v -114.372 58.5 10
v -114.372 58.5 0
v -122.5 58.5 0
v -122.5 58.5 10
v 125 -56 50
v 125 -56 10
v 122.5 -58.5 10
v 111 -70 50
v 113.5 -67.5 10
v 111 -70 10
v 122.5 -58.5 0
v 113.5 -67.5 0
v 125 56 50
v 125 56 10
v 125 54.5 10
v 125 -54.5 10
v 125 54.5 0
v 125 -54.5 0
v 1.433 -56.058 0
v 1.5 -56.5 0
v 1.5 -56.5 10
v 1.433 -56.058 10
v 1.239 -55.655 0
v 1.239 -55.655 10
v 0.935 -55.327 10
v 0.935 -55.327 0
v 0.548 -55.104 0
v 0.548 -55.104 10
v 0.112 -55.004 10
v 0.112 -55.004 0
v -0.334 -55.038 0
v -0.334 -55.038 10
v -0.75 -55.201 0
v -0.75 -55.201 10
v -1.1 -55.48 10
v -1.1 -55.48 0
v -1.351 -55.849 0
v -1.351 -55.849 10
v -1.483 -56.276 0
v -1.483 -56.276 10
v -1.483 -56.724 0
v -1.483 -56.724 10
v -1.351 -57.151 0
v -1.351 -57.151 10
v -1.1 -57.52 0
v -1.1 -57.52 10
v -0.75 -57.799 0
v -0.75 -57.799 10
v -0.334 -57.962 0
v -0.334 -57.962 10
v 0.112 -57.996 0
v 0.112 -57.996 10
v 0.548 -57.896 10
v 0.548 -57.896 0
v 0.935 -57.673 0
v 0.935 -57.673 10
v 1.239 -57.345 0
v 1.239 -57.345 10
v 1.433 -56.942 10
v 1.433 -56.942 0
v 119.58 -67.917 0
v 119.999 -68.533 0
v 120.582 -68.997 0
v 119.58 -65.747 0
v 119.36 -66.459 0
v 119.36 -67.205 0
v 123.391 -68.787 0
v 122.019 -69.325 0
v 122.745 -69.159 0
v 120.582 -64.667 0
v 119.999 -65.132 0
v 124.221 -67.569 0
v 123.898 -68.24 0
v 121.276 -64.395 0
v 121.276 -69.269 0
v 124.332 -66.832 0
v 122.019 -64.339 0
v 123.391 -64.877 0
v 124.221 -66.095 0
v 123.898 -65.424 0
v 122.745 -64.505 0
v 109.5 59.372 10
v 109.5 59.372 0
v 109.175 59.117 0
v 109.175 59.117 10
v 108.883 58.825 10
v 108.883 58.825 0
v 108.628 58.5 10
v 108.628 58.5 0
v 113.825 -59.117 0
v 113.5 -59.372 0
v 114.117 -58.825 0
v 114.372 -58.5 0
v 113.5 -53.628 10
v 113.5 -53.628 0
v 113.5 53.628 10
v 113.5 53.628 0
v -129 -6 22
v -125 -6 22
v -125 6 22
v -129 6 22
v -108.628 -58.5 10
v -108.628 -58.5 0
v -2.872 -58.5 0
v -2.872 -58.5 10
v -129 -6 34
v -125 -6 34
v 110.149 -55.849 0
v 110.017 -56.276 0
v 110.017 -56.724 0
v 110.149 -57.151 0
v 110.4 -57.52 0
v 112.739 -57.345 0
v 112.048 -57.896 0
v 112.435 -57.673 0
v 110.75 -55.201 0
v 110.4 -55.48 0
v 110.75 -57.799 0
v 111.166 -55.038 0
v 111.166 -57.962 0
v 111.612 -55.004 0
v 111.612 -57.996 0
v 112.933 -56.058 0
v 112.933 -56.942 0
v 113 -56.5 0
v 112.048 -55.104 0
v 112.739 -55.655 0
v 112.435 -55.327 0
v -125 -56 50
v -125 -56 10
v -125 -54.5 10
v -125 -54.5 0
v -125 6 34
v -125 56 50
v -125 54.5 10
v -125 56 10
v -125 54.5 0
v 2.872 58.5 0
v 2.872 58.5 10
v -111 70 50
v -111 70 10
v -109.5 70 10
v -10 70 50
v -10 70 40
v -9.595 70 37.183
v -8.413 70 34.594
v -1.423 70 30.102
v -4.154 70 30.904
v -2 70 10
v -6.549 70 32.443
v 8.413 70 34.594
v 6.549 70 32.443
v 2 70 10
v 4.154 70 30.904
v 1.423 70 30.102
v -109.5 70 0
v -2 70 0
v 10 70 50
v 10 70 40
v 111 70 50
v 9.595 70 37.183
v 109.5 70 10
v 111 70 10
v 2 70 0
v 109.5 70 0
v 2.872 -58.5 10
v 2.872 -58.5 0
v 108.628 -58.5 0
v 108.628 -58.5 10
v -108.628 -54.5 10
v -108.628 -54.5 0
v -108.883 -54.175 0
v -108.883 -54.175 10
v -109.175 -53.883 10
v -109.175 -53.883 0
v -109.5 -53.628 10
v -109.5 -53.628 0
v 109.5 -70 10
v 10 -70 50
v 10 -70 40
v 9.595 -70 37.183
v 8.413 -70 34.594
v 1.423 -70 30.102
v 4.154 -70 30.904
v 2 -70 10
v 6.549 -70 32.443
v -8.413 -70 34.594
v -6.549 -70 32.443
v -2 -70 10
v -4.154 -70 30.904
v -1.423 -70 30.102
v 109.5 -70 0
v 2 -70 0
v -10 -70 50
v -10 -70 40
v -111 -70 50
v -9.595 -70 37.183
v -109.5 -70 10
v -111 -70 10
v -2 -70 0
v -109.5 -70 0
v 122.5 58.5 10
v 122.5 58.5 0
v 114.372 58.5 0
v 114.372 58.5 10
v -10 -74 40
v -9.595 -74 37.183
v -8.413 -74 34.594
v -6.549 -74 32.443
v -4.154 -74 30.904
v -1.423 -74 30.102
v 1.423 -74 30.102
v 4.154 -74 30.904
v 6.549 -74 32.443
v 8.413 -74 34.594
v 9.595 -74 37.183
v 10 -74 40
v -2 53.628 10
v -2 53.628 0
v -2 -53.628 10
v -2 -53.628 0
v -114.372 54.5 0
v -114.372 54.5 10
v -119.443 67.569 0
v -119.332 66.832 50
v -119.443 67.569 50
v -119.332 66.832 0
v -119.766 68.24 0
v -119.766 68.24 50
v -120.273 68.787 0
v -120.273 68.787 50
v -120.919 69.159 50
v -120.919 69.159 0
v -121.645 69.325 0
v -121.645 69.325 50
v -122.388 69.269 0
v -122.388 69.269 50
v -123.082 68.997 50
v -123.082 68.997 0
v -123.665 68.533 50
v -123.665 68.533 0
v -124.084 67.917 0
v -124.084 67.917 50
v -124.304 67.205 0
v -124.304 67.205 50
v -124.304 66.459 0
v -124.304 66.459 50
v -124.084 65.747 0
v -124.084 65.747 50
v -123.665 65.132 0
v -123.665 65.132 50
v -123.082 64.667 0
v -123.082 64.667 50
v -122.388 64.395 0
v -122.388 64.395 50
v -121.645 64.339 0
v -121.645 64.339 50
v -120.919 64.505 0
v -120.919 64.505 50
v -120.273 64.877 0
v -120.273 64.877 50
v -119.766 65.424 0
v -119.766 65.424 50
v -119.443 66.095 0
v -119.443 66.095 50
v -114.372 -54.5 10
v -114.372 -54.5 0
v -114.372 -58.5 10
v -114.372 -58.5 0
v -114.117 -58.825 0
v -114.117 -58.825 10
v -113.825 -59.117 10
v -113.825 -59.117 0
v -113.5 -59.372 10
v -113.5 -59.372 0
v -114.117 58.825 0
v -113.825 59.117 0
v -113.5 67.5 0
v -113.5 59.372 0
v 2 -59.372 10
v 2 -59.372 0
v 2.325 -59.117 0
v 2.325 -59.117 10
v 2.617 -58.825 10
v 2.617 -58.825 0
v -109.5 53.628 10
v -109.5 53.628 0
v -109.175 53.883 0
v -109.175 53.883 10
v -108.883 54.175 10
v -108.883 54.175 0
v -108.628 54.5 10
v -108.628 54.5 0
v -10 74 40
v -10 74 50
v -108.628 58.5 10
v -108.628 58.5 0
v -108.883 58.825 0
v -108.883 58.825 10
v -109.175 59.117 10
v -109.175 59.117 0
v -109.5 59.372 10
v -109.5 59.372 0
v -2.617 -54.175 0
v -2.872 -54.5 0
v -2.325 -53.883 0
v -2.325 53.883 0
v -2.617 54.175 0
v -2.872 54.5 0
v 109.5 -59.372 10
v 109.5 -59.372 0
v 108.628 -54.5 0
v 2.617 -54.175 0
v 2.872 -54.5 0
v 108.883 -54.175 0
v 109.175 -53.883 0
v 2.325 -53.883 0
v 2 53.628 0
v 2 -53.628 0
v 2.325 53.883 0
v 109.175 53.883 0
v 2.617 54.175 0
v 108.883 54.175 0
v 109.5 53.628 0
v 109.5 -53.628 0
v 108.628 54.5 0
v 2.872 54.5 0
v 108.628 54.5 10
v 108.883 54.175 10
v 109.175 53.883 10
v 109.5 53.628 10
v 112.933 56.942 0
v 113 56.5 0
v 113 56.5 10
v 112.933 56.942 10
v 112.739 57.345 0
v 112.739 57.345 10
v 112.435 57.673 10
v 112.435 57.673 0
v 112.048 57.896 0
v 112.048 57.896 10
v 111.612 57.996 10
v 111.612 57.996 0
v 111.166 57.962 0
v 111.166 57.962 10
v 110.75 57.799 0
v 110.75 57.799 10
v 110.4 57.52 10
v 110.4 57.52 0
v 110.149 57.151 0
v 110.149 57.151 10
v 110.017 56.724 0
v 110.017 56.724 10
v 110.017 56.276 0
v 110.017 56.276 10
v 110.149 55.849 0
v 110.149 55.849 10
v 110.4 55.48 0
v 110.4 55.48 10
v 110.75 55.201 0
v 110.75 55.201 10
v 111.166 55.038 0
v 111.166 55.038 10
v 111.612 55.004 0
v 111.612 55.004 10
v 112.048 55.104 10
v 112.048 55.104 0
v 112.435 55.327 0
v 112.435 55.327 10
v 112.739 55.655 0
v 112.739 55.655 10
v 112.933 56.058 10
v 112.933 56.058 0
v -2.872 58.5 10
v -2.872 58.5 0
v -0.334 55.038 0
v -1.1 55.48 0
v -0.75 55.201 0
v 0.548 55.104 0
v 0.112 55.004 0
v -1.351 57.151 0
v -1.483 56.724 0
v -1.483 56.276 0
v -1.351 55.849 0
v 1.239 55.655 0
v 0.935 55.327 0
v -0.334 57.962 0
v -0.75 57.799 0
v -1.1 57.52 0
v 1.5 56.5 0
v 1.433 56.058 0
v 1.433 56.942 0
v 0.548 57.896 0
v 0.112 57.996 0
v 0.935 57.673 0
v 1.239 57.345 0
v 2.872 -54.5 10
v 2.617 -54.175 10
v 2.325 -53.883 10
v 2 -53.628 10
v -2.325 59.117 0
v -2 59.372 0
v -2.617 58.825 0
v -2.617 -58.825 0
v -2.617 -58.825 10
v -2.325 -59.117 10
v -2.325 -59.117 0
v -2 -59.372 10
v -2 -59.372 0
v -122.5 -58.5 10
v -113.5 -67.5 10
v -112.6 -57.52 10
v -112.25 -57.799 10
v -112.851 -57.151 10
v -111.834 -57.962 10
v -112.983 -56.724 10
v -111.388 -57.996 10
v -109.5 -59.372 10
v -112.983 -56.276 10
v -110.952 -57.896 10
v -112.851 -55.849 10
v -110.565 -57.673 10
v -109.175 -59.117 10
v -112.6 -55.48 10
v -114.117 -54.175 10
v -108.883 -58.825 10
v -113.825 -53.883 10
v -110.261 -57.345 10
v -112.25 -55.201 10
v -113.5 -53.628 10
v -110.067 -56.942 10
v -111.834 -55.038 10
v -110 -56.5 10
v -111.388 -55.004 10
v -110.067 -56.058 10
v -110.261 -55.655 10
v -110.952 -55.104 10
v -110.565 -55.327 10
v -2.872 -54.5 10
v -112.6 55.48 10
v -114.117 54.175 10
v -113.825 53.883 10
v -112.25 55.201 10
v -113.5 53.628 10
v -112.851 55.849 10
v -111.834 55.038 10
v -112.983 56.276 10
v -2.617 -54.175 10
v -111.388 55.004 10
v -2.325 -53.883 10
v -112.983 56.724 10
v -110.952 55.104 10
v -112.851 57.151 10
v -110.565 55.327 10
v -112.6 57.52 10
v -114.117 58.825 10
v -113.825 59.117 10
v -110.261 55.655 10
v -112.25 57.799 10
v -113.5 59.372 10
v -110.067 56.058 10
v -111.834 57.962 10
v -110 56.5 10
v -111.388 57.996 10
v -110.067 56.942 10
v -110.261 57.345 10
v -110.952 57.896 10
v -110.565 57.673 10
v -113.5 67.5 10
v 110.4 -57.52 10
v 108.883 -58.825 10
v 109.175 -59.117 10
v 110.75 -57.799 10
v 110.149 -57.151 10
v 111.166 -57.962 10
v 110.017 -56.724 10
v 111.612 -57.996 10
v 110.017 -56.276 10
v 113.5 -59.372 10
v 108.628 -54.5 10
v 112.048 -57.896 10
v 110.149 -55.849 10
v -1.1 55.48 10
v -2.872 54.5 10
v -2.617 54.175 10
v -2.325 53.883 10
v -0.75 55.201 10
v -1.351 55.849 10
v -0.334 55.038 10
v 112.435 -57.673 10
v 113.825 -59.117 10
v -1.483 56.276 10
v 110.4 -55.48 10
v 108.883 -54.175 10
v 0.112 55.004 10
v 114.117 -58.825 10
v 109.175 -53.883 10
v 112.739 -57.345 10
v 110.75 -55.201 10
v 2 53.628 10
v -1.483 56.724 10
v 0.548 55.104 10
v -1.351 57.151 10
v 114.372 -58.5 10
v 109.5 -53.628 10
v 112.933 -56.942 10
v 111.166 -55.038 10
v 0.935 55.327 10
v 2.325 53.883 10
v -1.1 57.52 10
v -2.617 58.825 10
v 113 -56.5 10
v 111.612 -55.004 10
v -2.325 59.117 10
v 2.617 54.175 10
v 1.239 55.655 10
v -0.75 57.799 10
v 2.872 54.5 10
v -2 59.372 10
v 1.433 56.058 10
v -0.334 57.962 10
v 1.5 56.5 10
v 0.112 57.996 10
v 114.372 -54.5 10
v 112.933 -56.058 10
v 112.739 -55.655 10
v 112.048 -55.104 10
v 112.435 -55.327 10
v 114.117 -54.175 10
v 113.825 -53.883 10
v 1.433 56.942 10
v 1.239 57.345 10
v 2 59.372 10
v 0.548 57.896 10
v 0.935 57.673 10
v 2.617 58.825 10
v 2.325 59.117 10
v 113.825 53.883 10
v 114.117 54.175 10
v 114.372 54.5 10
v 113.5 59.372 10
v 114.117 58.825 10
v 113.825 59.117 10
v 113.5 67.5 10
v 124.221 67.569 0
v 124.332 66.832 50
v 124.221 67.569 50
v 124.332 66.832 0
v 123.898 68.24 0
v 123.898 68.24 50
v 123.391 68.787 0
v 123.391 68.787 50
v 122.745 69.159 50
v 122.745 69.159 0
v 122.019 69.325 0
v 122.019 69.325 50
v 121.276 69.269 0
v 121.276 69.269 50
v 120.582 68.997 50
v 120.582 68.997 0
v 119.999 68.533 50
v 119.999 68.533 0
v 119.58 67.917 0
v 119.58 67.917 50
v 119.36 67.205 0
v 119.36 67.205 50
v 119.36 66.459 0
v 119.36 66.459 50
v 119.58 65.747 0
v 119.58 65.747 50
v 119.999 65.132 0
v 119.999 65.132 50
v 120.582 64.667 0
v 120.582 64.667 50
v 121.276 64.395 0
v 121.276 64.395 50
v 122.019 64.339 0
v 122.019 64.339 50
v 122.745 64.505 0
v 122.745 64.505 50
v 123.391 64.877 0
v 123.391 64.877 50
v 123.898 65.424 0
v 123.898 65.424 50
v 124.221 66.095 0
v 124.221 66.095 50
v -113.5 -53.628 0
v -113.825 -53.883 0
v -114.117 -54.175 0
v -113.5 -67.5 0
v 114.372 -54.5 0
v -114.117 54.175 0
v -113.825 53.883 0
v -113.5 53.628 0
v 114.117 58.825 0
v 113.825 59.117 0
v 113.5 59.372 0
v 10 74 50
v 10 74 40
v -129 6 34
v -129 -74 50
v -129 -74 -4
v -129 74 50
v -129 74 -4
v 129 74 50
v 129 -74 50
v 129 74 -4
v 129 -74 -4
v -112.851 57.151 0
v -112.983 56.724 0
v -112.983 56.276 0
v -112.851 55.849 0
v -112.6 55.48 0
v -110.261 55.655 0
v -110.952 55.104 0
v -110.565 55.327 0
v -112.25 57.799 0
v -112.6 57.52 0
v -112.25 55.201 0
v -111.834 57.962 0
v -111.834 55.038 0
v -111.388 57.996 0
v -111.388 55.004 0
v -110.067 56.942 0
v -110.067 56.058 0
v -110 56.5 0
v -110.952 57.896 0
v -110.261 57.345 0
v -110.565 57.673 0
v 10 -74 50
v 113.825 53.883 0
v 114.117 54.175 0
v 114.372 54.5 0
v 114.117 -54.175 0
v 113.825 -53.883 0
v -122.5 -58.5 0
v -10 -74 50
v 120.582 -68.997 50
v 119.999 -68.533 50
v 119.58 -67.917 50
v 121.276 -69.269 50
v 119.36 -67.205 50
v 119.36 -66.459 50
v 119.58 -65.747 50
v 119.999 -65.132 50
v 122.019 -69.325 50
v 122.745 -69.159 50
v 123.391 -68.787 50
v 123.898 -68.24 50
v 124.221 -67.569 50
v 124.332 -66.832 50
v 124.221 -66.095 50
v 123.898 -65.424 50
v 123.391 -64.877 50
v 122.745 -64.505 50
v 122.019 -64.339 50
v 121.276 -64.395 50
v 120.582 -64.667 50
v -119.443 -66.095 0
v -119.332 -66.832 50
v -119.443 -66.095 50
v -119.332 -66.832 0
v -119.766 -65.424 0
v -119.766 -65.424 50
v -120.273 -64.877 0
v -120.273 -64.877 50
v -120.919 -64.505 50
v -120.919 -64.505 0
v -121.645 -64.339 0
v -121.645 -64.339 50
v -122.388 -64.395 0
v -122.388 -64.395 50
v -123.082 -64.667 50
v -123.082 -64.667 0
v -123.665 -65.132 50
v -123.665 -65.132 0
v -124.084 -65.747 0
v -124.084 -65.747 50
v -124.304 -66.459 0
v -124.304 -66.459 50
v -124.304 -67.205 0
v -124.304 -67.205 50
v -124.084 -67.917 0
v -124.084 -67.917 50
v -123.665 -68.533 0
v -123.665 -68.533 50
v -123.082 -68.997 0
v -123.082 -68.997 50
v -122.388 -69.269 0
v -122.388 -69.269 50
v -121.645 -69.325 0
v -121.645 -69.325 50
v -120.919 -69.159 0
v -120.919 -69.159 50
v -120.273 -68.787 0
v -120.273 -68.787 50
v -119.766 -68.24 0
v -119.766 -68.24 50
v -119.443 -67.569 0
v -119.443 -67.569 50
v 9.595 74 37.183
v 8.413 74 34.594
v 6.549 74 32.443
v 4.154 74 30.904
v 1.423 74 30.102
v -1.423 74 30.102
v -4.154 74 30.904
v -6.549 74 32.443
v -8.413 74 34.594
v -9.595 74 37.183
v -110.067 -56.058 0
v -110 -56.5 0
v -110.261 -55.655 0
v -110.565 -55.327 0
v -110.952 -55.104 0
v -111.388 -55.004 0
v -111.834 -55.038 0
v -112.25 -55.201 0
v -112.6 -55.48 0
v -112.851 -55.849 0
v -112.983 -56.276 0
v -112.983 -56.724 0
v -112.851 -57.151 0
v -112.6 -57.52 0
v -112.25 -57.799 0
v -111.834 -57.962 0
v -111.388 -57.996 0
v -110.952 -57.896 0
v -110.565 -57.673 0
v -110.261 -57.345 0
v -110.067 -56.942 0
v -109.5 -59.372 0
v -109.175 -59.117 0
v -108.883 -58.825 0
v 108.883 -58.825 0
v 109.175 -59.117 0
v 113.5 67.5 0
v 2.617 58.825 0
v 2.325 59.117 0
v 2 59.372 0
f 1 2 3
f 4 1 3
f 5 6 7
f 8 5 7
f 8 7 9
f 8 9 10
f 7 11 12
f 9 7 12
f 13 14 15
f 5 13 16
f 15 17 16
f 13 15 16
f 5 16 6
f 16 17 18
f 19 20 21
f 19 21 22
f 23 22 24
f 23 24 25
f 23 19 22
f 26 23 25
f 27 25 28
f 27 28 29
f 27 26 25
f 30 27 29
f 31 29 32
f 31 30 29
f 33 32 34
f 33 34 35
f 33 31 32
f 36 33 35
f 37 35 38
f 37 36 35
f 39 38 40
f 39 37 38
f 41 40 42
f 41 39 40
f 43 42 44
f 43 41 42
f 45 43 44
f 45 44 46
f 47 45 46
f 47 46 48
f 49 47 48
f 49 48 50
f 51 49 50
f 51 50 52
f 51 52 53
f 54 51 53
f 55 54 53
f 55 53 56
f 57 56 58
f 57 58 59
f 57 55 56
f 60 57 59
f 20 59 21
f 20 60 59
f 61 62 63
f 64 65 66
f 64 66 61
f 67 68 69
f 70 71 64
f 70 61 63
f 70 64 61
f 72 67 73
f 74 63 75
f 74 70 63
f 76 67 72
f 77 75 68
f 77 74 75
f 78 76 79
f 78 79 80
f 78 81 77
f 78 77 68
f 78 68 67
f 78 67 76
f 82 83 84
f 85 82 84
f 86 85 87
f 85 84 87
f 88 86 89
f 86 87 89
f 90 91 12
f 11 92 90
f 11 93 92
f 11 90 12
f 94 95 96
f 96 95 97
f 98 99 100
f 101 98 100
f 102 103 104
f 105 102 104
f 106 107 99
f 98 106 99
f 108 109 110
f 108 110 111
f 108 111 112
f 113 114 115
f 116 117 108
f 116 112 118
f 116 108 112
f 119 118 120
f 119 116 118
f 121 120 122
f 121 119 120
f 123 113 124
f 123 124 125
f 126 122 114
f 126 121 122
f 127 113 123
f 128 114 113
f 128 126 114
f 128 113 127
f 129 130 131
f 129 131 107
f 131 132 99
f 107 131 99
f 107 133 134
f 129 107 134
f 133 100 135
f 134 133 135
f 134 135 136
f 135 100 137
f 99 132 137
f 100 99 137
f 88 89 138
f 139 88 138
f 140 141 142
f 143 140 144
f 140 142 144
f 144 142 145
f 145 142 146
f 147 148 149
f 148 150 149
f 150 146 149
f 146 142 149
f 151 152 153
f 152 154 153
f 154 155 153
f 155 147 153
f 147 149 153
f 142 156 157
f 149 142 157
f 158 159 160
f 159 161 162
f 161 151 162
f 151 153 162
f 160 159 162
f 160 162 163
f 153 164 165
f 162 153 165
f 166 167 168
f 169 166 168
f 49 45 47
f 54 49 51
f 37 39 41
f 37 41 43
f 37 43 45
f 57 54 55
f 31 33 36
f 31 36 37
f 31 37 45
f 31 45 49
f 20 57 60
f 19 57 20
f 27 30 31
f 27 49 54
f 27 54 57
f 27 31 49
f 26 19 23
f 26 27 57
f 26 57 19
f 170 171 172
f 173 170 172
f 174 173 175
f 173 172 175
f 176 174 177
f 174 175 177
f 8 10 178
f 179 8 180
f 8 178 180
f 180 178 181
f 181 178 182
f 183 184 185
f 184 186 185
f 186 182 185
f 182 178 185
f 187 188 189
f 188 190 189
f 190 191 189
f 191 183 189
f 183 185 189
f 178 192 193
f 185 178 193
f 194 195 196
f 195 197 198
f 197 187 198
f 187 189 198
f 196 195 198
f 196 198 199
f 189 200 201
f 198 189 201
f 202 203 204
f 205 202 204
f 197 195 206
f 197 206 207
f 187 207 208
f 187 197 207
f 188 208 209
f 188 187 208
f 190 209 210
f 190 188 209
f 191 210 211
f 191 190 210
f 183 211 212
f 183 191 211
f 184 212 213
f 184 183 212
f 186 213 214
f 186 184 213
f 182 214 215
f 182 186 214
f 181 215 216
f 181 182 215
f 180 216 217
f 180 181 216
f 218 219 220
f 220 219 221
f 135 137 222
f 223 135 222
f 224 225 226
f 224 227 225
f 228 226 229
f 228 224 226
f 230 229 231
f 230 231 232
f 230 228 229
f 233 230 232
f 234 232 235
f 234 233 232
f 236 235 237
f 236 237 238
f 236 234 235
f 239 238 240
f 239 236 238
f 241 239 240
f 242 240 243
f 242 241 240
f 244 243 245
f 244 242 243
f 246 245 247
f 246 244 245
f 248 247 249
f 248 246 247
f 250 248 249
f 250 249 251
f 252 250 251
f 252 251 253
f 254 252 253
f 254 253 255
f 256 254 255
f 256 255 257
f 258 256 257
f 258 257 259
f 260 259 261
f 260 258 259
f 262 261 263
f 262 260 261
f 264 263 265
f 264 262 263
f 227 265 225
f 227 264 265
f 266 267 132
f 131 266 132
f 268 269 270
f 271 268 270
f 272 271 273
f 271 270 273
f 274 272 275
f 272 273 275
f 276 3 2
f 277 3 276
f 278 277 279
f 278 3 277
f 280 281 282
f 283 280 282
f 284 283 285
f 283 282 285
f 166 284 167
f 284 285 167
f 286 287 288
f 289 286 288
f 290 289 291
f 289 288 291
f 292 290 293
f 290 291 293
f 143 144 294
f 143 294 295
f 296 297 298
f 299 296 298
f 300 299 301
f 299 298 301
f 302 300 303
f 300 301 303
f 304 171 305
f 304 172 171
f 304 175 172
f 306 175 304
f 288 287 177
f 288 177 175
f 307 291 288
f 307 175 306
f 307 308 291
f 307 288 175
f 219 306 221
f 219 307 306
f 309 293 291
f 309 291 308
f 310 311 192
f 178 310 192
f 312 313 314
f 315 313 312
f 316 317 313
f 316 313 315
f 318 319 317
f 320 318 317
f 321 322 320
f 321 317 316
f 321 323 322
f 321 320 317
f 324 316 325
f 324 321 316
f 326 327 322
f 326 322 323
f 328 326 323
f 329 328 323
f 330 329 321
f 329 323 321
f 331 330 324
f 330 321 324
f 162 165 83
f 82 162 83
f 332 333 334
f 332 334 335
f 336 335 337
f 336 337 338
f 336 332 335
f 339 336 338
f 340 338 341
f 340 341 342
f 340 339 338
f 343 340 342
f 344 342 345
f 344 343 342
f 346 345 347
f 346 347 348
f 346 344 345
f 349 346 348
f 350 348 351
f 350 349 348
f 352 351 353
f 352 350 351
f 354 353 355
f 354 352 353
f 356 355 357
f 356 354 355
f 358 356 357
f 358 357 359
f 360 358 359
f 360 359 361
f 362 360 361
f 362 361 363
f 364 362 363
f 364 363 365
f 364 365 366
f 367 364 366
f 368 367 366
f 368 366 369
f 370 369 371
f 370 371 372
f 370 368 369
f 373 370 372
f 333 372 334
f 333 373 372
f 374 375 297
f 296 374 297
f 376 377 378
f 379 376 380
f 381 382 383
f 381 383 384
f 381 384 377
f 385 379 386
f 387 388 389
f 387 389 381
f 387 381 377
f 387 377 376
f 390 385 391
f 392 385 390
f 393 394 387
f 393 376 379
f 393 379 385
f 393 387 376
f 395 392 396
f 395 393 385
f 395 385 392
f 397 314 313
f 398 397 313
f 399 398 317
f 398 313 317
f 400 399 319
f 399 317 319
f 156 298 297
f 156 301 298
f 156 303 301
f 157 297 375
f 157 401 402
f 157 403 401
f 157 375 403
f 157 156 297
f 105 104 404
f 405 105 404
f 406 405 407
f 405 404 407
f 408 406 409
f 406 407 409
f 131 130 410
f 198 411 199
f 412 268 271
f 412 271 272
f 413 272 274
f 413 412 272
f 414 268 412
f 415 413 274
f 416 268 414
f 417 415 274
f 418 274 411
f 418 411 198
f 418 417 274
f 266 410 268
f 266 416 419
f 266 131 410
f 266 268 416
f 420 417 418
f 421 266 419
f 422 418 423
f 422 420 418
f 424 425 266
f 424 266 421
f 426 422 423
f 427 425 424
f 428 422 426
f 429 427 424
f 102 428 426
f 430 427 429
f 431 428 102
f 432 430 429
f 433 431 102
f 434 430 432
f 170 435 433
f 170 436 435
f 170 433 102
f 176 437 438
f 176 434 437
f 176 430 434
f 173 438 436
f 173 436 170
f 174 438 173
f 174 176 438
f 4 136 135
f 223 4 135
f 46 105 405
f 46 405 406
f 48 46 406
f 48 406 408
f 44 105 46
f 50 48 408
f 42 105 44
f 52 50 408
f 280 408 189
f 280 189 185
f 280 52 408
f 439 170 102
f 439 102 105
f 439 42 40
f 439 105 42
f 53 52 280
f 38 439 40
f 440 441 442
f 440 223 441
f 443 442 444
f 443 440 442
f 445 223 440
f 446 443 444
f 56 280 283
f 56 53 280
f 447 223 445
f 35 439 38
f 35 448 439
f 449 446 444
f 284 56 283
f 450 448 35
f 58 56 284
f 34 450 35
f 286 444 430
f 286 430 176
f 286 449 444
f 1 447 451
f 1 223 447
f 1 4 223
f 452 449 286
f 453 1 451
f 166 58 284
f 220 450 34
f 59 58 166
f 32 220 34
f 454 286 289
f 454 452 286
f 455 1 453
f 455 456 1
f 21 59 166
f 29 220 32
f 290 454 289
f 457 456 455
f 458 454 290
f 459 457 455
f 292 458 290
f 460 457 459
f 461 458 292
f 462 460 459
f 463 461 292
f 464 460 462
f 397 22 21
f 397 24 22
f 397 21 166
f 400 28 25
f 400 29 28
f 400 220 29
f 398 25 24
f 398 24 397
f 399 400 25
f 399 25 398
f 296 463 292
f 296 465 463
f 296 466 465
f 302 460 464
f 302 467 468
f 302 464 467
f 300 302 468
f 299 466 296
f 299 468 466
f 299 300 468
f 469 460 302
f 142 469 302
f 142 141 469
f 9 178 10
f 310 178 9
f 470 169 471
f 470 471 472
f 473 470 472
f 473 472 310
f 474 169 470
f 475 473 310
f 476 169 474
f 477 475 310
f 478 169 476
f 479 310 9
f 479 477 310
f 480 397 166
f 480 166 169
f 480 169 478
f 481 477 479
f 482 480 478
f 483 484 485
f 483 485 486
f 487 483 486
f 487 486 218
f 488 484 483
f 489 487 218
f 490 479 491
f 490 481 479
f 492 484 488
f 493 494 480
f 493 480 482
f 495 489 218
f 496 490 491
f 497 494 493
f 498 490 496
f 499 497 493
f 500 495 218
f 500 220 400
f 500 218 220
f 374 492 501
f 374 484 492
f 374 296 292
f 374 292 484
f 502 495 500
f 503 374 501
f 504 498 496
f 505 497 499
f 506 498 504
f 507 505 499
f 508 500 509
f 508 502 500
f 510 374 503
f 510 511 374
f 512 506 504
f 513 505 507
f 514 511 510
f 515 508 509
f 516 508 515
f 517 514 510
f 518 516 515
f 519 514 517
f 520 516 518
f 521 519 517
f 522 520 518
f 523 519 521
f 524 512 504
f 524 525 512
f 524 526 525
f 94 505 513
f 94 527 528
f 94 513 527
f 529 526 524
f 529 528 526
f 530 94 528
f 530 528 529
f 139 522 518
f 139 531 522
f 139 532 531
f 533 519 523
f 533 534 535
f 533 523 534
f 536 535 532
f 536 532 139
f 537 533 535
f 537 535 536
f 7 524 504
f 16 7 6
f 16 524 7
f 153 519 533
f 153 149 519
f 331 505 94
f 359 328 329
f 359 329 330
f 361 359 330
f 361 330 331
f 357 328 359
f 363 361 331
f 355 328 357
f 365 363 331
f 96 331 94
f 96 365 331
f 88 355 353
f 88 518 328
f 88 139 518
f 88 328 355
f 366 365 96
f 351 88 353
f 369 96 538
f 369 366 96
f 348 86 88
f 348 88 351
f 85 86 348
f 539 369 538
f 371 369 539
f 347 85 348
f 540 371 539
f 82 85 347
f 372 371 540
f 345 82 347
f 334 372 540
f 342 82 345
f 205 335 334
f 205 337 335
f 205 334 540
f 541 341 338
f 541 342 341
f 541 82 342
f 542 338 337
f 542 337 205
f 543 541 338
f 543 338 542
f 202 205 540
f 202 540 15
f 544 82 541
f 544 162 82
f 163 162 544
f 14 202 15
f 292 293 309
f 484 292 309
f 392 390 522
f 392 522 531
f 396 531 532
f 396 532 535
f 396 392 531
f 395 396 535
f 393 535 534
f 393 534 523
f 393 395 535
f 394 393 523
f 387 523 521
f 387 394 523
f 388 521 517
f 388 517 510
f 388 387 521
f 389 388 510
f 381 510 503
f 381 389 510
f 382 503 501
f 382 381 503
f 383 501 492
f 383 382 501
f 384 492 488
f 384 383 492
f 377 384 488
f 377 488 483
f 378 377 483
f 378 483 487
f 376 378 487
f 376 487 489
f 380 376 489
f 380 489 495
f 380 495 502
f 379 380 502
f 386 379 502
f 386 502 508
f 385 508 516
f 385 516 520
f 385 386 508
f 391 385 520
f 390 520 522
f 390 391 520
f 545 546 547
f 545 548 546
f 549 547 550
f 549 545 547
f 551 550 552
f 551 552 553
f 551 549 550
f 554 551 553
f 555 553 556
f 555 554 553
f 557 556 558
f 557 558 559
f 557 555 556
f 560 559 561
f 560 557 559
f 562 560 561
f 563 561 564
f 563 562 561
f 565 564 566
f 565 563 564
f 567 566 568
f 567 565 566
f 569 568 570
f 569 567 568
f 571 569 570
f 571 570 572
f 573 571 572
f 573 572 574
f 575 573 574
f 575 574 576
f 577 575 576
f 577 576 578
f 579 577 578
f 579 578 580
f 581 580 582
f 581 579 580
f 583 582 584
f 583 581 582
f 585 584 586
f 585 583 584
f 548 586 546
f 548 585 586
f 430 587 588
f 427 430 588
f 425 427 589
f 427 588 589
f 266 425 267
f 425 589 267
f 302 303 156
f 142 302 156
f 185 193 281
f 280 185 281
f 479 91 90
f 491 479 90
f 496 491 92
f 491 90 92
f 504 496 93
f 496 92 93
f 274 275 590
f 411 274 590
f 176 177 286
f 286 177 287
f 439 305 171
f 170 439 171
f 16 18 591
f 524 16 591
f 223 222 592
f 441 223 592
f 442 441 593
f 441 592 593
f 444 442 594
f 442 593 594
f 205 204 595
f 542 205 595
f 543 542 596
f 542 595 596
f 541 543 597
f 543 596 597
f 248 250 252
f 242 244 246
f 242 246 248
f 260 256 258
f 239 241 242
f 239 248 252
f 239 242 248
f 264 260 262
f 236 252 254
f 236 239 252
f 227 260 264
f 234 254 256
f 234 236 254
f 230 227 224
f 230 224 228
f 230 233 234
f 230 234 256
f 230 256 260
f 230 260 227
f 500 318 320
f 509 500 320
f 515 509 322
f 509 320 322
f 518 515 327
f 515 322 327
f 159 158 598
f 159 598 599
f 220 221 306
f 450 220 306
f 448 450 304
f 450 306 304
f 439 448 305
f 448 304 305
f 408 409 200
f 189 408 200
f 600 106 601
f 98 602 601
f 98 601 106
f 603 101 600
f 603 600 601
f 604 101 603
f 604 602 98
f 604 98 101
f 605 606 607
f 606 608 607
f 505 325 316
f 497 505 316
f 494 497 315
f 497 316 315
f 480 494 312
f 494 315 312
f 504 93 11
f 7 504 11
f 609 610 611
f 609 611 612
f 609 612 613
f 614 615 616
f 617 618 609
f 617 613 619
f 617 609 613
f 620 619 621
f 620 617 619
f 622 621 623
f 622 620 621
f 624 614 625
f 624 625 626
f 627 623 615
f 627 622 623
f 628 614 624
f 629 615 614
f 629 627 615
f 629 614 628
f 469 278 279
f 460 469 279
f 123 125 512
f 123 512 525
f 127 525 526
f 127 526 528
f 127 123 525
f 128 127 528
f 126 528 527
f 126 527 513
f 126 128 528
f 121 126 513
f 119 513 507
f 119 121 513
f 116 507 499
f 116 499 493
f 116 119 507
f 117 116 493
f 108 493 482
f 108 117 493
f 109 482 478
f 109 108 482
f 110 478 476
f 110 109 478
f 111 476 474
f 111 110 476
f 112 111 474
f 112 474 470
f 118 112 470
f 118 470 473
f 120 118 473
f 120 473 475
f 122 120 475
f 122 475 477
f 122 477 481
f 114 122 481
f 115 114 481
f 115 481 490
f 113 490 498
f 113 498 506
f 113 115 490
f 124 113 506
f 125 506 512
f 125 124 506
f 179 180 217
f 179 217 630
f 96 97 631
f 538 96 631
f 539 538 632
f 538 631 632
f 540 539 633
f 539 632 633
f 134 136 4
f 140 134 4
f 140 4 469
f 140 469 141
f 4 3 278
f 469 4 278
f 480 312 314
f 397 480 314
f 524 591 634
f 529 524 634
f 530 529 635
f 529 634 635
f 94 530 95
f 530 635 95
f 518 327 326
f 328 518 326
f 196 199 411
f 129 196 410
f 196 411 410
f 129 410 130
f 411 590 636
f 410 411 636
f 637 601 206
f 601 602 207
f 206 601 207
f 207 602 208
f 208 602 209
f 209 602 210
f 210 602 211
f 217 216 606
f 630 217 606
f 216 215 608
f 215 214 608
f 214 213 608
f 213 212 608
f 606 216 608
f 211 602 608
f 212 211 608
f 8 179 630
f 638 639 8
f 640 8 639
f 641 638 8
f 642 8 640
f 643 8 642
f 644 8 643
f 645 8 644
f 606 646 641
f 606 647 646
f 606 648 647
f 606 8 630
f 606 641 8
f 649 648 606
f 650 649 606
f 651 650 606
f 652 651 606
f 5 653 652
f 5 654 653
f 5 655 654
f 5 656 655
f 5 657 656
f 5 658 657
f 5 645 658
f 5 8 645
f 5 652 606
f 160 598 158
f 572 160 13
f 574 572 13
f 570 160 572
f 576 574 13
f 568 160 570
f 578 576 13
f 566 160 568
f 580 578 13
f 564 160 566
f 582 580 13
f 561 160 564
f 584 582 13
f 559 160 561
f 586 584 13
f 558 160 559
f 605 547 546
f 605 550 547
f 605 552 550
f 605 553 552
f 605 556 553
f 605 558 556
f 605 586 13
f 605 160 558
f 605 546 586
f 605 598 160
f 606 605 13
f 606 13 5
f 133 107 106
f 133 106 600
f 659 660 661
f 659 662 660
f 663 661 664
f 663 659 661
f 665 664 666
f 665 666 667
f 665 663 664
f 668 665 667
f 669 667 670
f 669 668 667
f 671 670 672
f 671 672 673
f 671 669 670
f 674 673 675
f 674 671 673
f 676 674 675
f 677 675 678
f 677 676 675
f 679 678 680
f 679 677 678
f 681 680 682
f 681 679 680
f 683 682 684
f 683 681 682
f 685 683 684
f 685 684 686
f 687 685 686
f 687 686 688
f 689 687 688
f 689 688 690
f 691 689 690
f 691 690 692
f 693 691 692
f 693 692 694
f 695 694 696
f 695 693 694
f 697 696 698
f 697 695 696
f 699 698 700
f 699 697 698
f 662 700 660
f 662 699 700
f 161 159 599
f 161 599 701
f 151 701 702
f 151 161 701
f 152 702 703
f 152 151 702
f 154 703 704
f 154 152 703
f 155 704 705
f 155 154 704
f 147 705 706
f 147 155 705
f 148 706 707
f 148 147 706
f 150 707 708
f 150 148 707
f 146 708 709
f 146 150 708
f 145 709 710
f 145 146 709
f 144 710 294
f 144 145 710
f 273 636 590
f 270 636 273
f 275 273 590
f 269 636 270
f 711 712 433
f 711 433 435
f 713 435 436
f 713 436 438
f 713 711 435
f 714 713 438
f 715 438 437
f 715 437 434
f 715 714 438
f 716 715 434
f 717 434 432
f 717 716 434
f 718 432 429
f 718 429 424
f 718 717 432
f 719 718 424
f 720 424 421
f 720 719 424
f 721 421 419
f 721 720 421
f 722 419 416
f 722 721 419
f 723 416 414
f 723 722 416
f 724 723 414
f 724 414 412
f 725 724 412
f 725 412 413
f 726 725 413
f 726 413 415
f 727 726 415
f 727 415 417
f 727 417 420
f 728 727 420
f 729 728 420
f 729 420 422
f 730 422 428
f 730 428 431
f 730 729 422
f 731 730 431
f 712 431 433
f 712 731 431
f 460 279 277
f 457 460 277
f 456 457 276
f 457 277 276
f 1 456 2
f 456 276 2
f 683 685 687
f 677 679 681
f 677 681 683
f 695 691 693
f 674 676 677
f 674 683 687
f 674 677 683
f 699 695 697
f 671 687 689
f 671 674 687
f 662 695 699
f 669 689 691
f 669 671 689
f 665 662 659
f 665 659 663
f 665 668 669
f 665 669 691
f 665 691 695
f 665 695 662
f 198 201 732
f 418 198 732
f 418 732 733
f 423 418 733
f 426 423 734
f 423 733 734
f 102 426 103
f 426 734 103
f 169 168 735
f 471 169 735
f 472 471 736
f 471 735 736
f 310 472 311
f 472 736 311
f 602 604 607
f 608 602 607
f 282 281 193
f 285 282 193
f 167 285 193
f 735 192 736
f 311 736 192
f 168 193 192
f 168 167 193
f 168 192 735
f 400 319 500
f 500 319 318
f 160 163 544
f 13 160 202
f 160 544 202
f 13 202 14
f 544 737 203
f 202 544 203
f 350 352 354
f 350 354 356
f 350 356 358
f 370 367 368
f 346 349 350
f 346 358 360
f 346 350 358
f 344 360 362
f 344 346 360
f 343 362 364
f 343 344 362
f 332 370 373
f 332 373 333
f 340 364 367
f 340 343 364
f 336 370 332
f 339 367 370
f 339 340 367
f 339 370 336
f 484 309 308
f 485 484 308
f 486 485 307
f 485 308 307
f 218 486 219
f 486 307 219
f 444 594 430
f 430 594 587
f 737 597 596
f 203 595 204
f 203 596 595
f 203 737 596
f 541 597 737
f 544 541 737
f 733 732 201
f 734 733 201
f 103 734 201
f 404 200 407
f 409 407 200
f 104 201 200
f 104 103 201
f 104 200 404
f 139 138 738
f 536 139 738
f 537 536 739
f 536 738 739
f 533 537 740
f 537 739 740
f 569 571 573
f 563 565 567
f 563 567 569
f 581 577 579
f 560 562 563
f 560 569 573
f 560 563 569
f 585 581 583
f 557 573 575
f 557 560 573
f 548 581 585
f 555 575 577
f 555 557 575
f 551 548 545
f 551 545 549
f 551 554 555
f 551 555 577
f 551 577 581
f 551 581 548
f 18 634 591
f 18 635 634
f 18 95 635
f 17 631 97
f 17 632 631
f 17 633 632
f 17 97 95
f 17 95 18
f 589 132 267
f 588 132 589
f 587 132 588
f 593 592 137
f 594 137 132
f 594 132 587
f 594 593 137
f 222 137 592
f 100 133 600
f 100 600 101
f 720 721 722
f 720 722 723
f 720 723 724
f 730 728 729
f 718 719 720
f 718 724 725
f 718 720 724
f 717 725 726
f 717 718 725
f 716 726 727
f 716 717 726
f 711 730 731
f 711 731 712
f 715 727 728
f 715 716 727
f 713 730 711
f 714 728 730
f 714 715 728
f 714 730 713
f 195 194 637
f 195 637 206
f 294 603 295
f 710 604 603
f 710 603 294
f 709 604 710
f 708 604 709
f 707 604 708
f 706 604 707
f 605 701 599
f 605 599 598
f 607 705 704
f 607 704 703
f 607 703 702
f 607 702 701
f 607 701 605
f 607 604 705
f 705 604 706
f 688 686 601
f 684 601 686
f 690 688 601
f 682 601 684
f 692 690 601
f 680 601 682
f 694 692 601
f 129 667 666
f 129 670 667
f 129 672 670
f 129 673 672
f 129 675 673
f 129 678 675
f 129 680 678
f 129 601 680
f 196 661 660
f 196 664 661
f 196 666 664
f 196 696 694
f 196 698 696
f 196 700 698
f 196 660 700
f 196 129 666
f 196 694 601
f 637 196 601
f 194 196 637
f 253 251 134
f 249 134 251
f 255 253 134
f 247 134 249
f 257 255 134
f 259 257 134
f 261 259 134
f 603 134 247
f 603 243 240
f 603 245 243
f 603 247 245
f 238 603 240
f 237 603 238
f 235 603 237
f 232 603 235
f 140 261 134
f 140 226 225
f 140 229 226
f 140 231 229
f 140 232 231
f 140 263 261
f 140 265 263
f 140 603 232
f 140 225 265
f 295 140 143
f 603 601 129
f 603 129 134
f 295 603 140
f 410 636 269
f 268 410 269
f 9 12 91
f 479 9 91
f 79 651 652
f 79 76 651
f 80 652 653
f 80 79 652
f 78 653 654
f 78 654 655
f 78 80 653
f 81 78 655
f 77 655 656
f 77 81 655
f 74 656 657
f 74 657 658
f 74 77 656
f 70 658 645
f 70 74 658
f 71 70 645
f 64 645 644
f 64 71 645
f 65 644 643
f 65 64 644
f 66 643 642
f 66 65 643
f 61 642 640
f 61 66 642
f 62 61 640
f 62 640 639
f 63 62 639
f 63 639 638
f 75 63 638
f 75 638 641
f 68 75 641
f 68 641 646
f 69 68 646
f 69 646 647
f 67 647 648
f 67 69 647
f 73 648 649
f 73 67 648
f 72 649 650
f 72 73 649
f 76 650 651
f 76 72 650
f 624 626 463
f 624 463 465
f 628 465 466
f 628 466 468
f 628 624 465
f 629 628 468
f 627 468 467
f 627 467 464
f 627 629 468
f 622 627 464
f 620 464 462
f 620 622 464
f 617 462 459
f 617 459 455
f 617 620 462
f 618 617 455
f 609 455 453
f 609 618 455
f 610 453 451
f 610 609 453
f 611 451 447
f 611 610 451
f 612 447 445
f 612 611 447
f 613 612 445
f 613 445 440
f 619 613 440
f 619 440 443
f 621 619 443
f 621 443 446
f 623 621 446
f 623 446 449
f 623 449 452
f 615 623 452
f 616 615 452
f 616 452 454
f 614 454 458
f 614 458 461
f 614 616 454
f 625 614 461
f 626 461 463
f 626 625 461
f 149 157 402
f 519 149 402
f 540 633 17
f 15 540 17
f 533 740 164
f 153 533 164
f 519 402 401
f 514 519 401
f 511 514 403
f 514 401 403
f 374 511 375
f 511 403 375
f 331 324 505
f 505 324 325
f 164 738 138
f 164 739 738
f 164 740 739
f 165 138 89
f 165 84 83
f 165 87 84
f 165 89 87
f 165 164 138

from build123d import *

# Parameters (mm, degrees)
ESQUISSE1_W             = 258
ESQUISSE1_H             = 148
ESQUISSE1_R             = 2.5
ESQUISSE1_R_2           = 1.5
BOSS_EXTRU_2_DEPTH      = 10
ESQUISSE1_5_W           = 258
ESQUISSE1_5_H           = 148
BOSS_EXTRU_3_DEPTH      = 4
ESQUISSE2_W             = 258
ESQUISSE2_H             = 148
ESQUISSE2_R             = 2.5
BOSS_EXTRU_5_DEPTH      = 40
ENL_V_MAT_EXTRU_1_REACH = 271.243
ESQUISSE4_W             = 12
ESQUISSE4_H             = 12
ENL_V_MAT_EXTRU_2_REACH = 201.692
ENL_V_MAT_EXTRU_3_REACH = 201.692


with BuildPart() as part:
    # Esquisse1 → Boss.-Extru.2 (new body)
    with BuildSketch(Plane.XY):
        Rectangle(ESQUISSE1_W, ESQUISSE1_H)
        with BuildLine():
            Line((-109.5, 59.372281323), (-109.5, 70))
            Line((-109.5, 70), (-2, 70))
            Line((-2, 70), (-2, 59.372281323))
            ThreePointArc((-2, 59.372281323), (-2.474873734, 58.974873734), (-2.872281323, 58.5))
            Line((-2.872281323, 58.5), (-108.627718677, 58.5))
            ThreePointArc((-108.627718677, 58.5), (-109.025126266, 58.974873734), (-109.5, 59.372281323))
        make_face(mode=Mode.SUBTRACT)
        with BuildLine():
            Line((-113.5, 67.5), (-113.5, 59.372281323))
            ThreePointArc((-113.5, 59.372281323), (-113.974873734, 58.974873734), (-114.372281323, 58.5))
            Line((-114.372281323, 58.5), (-122.5, 58.5))
            Line((-122.5, 58.5), (-113.5, 67.5))
        make_face(mode=Mode.SUBTRACT)
        with Locations((-121.8320772, -66.8320772)):
            Circle(ESQUISSE1_R, mode=Mode.SUBTRACT)
        with Locations((121.8320772, -66.8320772)):
            Circle(ESQUISSE1_R, mode=Mode.SUBTRACT)
        with Locations((-121.8320772, 66.8320772)):
            Circle(ESQUISSE1_R, mode=Mode.SUBTRACT)
        with Locations((121.8320772, 66.8320772)):
            Circle(ESQUISSE1_R, mode=Mode.SUBTRACT)
        with BuildLine():
            Line((-125, -54.5), (-125, 54.5))
            Line((-125, 54.5), (-114.372281323, 54.5))
            ThreePointArc((-114.372281323, 54.5), (-113.974873734, 54.025126266), (-113.5, 53.627718677))
            Line((-113.5, 53.627718677), (-113.5, -53.627718677))
            ThreePointArc((-113.5, -53.627718677), (-113.974873734, -54.025126266), (-114.372281323, -54.5))
            Line((-114.372281323, -54.5), (-125, -54.5))
        make_face(mode=Mode.SUBTRACT)
        with BuildLine():
            Line((-113.5, -67.5), (-122.5, -58.5))
            Line((-122.5, -58.5), (-114.372281323, -58.5))
            ThreePointArc((-114.372281323, -58.5), (-113.974873734, -58.974873734), (-113.5, -59.372281323))
            Line((-113.5, -59.372281323), (-113.5, -67.5))
        make_face(mode=Mode.SUBTRACT)
        with BuildLine():
            Line((-2, -70), (-109.5, -70))
            Line((-109.5, -70), (-109.5, -59.372281323))
            ThreePointArc((-109.5, -59.372281323), (-109.025126266, -58.974873734), (-108.627718677, -58.5))
            Line((-108.627718677, -58.5), (-2.872281323, -58.5))
            ThreePointArc((-2.872281323, -58.5), (-2.474873734, -58.974873734), (-2, -59.372281323))
            Line((-2, -59.372281323), (-2, -70))
        make_face(mode=Mode.SUBTRACT)
        with BuildLine():
            Line((109.5, -70), (2, -70))
            Line((2, -70), (2, -59.372281323))
            ThreePointArc((2, -59.372281323), (2.474873734, -58.974873734), (2.872281323, -58.5))
            Line((2.872281323, -58.5), (108.627718677, -58.5))
            ThreePointArc((108.627718677, -58.5), (109.025126266, -58.974873734), (109.5, -59.372281323))
            Line((109.5, -59.372281323), (109.5, -70))
        make_face(mode=Mode.SUBTRACT)
        with BuildLine():
            Line((122.5, -58.5), (113.5, -67.5))
            Line((113.5, -67.5), (113.5, -59.372281323))
            ThreePointArc((113.5, -59.372281323), (113.974873734, -58.974873734), (114.372281323, -58.5))
            Line((114.372281323, -58.5), (122.5, -58.5))
        make_face(mode=Mode.SUBTRACT)
        with BuildLine():
            Line((125, 54.5), (125, -54.5))
            Line((125, -54.5), (114.372281323, -54.5))
            ThreePointArc((114.372281323, -54.5), (113.974873734, -54.025126266), (113.5, -53.627718677))
            Line((113.5, -53.627718677), (113.5, 53.627718677))
            ThreePointArc((113.5, 53.627718677), (113.974873734, 54.025126266), (114.372281323, 54.5))
            Line((114.372281323, 54.5), (125, 54.5))
        make_face(mode=Mode.SUBTRACT)
        with BuildLine():
            Line((113.5, 67.5), (122.5, 58.5))
            Line((122.5, 58.5), (114.372281323, 58.5))
            ThreePointArc((114.372281323, 58.5), (113.974873734, 58.974873734), (113.5, 59.372281323))
            Line((113.5, 59.372281323), (113.5, 67.5))
        make_face(mode=Mode.SUBTRACT)
        with BuildLine():
            Line((2, 70), (109.5, 70))
            Line((109.5, 70), (109.5, 59.372281323))
            ThreePointArc((109.5, 59.372281323), (109.025126266, 58.974873734), (108.627718677, 58.5))
            Line((108.627718677, 58.5), (2.872281323, 58.5))
            ThreePointArc((2.872281323, 58.5), (2.474873734, 58.974873734), (2, 59.372281323))
            Line((2, 59.372281323), (2, 70))
        make_face(mode=Mode.SUBTRACT)
        with BuildLine():
            ThreePointArc((-109.5, 53.627718677), (-109.025126266, 54.025126266), (-108.627718677, 54.5))
            Line((-108.627718677, 54.5), (-2.872281323, 54.5))
            ThreePointArc((-2.872281323, 54.5), (-2.474873734, 54.025126266), (-2, 53.627718677))
            Line((-2, 53.627718677), (-2, -53.627718677))
            ThreePointArc((-2, -53.627718677), (-2.474873734, -54.025126266), (-2.872281323, -54.5))
            Line((-2.872281323, -54.5), (-108.627718677, -54.5))
            ThreePointArc((-108.627718677, -54.5), (-109.025126266, -54.025126266), (-109.5, -53.627718677))
            Line((-109.5, -53.627718677), (-109.5, 53.627718677))
        make_face(mode=Mode.SUBTRACT)
        with Locations((-111.5, 56.5)):
            Circle(ESQUISSE1_R_2, mode=Mode.SUBTRACT)
        with Locations((-111.5, -56.5)):
            Circle(ESQUISSE1_R_2, mode=Mode.SUBTRACT)
        with BuildLine():
            ThreePointArc((2.872281323, -54.5), (2.474873734, -54.025126266), (2, -53.627718677))
            Line((2, -53.627718677), (2, 53.627718677))
            ThreePointArc((2, 53.627718677), (2.474873734, 54.025126266), (2.872281323, 54.5))
            Line((2.872281323, 54.5), (108.627718677, 54.5))
            ThreePointArc((108.627718677, 54.5), (109.025126266, 54.025126266), (109.5, 53.627718677))
            Line((109.5, 53.627718677), (109.5, -53.627718677))
            ThreePointArc((109.5, -53.627718677), (109.025126266, -54.025126266), (108.627718677, -54.5))
            Line((108.627718677, -54.5), (2.872281323, -54.5))
        make_face(mode=Mode.SUBTRACT)
        with Locations((0, -56.5)):
            Circle(ESQUISSE1_R_2, mode=Mode.SUBTRACT)
        with Locations((111.5, -56.5)):
            Circle(ESQUISSE1_R_2, mode=Mode.SUBTRACT)
        with Locations((111.5, 56.5)):
            Circle(ESQUISSE1_R_2, mode=Mode.SUBTRACT)
        with Locations((0, 56.5)):
            Circle(ESQUISSE1_R_2, mode=Mode.SUBTRACT)
    extrude(amount=BOSS_EXTRU_2_DEPTH)

    # Esquisse1<5> → Boss.-Extru.3 (add)
    with BuildSketch(Plane.XY):
        Rectangle(ESQUISSE1_5_W, ESQUISSE1_5_H)
    extrude(amount=-BOSS_EXTRU_3_DEPTH)

    # Esquisse2 → Boss.-Extru.5 (add)
    with BuildSketch(Plane.XY.offset(10)):
        Rectangle(ESQUISSE2_W, ESQUISSE2_H)
        with Locations((-121.8320772, 66.8320772)):
            Circle(ESQUISSE2_R, mode=Mode.SUBTRACT)
        with Locations((-121.8320772, -66.8320772)):
            Circle(ESQUISSE2_R, mode=Mode.SUBTRACT)
        with Locations((121.8320772, -66.8320772)):
            Circle(ESQUISSE2_R, mode=Mode.SUBTRACT)
        with Locations((121.8320772, 66.8320772)):
            Circle(ESQUISSE2_R, mode=Mode.SUBTRACT)
        Polygon((-111, 70), (111, 70), (125, 56), (125, -56), (111, -70), (-111, -70), (-125, -56), (-125, 56), align=None, mode=Mode.SUBTRACT)
    extrude(amount=BOSS_EXTRU_5_DEPTH)

    # Esquisse4 → Enlèv. mat.-Extru.1 (cut, up to next)
    with BuildSketch(Plane(origin=(-125, 0, 0), x_dir=(0, 0, -1), z_dir=(1, 0, 0)), mode=Mode.PRIVATE) as enl_v_mat_extru_1_sk1:
        with Locations((-28, 0)):
            Rectangle(ESQUISSE4_W, ESQUISSE4_H)
    enl_v_mat_extru_1_tool1 = extrude(enl_v_mat_extru_1_sk1.sketch, amount=-ENL_V_MAT_EXTRU_1_REACH, mode=Mode.PRIVATE) & part.part
    add(enl_v_mat_extru_1_tool1.solids().sort_by_distance((-125, 0, 28))[0], mode=Mode.SUBTRACT)

    # Esquisse6 → Enlèv. mat.-Extru.2 (cut, up to next)
    with BuildSketch(Plane(origin=(0, -70, 0), x_dir=(1, 0, 0), z_dir=(0, 1, 0)), mode=Mode.PRIVATE) as enl_v_mat_extru_2_sk1:
        with BuildLine():
            Line((10, -40), (10, -50))
            Line((10, -50), (-10, -50))
            Line((-10, -50), (-10, -40))
            ThreePointArc((-10, -40), (0, -30), (10, -40))
        make_face()
    enl_v_mat_extru_2_tool1 = extrude(enl_v_mat_extru_2_sk1.sketch, amount=-ENL_V_MAT_EXTRU_2_REACH, mode=Mode.PRIVATE) & part.part
    add(enl_v_mat_extru_2_tool1.solids().sort_by_distance((0, -70, 40.933499))[0], mode=Mode.SUBTRACT)

    # Esquisse9 → Enlèv. mat.-Extru.3 (cut, up to next)
    with BuildSketch(Plane.XZ.offset(-70), mode=Mode.PRIVATE) as enl_v_mat_extru_3_sk1:
        with BuildLine():
            Line((-10, 40), (-10, 50))
            Line((-10, 50), (10, 50))
            Line((10, 50), (10, 40))
            ThreePointArc((10, 40), (0, 30), (-10, 40))
        make_face()
    enl_v_mat_extru_3_tool1 = extrude(enl_v_mat_extru_3_sk1.sketch, amount=-ENL_V_MAT_EXTRU_3_REACH, mode=Mode.PRIVATE) & part.part
    add(enl_v_mat_extru_3_tool1.solids().sort_by_distance((0, 70, 40.933499))[0], mode=Mode.SUBTRACT)


solid = part.part
